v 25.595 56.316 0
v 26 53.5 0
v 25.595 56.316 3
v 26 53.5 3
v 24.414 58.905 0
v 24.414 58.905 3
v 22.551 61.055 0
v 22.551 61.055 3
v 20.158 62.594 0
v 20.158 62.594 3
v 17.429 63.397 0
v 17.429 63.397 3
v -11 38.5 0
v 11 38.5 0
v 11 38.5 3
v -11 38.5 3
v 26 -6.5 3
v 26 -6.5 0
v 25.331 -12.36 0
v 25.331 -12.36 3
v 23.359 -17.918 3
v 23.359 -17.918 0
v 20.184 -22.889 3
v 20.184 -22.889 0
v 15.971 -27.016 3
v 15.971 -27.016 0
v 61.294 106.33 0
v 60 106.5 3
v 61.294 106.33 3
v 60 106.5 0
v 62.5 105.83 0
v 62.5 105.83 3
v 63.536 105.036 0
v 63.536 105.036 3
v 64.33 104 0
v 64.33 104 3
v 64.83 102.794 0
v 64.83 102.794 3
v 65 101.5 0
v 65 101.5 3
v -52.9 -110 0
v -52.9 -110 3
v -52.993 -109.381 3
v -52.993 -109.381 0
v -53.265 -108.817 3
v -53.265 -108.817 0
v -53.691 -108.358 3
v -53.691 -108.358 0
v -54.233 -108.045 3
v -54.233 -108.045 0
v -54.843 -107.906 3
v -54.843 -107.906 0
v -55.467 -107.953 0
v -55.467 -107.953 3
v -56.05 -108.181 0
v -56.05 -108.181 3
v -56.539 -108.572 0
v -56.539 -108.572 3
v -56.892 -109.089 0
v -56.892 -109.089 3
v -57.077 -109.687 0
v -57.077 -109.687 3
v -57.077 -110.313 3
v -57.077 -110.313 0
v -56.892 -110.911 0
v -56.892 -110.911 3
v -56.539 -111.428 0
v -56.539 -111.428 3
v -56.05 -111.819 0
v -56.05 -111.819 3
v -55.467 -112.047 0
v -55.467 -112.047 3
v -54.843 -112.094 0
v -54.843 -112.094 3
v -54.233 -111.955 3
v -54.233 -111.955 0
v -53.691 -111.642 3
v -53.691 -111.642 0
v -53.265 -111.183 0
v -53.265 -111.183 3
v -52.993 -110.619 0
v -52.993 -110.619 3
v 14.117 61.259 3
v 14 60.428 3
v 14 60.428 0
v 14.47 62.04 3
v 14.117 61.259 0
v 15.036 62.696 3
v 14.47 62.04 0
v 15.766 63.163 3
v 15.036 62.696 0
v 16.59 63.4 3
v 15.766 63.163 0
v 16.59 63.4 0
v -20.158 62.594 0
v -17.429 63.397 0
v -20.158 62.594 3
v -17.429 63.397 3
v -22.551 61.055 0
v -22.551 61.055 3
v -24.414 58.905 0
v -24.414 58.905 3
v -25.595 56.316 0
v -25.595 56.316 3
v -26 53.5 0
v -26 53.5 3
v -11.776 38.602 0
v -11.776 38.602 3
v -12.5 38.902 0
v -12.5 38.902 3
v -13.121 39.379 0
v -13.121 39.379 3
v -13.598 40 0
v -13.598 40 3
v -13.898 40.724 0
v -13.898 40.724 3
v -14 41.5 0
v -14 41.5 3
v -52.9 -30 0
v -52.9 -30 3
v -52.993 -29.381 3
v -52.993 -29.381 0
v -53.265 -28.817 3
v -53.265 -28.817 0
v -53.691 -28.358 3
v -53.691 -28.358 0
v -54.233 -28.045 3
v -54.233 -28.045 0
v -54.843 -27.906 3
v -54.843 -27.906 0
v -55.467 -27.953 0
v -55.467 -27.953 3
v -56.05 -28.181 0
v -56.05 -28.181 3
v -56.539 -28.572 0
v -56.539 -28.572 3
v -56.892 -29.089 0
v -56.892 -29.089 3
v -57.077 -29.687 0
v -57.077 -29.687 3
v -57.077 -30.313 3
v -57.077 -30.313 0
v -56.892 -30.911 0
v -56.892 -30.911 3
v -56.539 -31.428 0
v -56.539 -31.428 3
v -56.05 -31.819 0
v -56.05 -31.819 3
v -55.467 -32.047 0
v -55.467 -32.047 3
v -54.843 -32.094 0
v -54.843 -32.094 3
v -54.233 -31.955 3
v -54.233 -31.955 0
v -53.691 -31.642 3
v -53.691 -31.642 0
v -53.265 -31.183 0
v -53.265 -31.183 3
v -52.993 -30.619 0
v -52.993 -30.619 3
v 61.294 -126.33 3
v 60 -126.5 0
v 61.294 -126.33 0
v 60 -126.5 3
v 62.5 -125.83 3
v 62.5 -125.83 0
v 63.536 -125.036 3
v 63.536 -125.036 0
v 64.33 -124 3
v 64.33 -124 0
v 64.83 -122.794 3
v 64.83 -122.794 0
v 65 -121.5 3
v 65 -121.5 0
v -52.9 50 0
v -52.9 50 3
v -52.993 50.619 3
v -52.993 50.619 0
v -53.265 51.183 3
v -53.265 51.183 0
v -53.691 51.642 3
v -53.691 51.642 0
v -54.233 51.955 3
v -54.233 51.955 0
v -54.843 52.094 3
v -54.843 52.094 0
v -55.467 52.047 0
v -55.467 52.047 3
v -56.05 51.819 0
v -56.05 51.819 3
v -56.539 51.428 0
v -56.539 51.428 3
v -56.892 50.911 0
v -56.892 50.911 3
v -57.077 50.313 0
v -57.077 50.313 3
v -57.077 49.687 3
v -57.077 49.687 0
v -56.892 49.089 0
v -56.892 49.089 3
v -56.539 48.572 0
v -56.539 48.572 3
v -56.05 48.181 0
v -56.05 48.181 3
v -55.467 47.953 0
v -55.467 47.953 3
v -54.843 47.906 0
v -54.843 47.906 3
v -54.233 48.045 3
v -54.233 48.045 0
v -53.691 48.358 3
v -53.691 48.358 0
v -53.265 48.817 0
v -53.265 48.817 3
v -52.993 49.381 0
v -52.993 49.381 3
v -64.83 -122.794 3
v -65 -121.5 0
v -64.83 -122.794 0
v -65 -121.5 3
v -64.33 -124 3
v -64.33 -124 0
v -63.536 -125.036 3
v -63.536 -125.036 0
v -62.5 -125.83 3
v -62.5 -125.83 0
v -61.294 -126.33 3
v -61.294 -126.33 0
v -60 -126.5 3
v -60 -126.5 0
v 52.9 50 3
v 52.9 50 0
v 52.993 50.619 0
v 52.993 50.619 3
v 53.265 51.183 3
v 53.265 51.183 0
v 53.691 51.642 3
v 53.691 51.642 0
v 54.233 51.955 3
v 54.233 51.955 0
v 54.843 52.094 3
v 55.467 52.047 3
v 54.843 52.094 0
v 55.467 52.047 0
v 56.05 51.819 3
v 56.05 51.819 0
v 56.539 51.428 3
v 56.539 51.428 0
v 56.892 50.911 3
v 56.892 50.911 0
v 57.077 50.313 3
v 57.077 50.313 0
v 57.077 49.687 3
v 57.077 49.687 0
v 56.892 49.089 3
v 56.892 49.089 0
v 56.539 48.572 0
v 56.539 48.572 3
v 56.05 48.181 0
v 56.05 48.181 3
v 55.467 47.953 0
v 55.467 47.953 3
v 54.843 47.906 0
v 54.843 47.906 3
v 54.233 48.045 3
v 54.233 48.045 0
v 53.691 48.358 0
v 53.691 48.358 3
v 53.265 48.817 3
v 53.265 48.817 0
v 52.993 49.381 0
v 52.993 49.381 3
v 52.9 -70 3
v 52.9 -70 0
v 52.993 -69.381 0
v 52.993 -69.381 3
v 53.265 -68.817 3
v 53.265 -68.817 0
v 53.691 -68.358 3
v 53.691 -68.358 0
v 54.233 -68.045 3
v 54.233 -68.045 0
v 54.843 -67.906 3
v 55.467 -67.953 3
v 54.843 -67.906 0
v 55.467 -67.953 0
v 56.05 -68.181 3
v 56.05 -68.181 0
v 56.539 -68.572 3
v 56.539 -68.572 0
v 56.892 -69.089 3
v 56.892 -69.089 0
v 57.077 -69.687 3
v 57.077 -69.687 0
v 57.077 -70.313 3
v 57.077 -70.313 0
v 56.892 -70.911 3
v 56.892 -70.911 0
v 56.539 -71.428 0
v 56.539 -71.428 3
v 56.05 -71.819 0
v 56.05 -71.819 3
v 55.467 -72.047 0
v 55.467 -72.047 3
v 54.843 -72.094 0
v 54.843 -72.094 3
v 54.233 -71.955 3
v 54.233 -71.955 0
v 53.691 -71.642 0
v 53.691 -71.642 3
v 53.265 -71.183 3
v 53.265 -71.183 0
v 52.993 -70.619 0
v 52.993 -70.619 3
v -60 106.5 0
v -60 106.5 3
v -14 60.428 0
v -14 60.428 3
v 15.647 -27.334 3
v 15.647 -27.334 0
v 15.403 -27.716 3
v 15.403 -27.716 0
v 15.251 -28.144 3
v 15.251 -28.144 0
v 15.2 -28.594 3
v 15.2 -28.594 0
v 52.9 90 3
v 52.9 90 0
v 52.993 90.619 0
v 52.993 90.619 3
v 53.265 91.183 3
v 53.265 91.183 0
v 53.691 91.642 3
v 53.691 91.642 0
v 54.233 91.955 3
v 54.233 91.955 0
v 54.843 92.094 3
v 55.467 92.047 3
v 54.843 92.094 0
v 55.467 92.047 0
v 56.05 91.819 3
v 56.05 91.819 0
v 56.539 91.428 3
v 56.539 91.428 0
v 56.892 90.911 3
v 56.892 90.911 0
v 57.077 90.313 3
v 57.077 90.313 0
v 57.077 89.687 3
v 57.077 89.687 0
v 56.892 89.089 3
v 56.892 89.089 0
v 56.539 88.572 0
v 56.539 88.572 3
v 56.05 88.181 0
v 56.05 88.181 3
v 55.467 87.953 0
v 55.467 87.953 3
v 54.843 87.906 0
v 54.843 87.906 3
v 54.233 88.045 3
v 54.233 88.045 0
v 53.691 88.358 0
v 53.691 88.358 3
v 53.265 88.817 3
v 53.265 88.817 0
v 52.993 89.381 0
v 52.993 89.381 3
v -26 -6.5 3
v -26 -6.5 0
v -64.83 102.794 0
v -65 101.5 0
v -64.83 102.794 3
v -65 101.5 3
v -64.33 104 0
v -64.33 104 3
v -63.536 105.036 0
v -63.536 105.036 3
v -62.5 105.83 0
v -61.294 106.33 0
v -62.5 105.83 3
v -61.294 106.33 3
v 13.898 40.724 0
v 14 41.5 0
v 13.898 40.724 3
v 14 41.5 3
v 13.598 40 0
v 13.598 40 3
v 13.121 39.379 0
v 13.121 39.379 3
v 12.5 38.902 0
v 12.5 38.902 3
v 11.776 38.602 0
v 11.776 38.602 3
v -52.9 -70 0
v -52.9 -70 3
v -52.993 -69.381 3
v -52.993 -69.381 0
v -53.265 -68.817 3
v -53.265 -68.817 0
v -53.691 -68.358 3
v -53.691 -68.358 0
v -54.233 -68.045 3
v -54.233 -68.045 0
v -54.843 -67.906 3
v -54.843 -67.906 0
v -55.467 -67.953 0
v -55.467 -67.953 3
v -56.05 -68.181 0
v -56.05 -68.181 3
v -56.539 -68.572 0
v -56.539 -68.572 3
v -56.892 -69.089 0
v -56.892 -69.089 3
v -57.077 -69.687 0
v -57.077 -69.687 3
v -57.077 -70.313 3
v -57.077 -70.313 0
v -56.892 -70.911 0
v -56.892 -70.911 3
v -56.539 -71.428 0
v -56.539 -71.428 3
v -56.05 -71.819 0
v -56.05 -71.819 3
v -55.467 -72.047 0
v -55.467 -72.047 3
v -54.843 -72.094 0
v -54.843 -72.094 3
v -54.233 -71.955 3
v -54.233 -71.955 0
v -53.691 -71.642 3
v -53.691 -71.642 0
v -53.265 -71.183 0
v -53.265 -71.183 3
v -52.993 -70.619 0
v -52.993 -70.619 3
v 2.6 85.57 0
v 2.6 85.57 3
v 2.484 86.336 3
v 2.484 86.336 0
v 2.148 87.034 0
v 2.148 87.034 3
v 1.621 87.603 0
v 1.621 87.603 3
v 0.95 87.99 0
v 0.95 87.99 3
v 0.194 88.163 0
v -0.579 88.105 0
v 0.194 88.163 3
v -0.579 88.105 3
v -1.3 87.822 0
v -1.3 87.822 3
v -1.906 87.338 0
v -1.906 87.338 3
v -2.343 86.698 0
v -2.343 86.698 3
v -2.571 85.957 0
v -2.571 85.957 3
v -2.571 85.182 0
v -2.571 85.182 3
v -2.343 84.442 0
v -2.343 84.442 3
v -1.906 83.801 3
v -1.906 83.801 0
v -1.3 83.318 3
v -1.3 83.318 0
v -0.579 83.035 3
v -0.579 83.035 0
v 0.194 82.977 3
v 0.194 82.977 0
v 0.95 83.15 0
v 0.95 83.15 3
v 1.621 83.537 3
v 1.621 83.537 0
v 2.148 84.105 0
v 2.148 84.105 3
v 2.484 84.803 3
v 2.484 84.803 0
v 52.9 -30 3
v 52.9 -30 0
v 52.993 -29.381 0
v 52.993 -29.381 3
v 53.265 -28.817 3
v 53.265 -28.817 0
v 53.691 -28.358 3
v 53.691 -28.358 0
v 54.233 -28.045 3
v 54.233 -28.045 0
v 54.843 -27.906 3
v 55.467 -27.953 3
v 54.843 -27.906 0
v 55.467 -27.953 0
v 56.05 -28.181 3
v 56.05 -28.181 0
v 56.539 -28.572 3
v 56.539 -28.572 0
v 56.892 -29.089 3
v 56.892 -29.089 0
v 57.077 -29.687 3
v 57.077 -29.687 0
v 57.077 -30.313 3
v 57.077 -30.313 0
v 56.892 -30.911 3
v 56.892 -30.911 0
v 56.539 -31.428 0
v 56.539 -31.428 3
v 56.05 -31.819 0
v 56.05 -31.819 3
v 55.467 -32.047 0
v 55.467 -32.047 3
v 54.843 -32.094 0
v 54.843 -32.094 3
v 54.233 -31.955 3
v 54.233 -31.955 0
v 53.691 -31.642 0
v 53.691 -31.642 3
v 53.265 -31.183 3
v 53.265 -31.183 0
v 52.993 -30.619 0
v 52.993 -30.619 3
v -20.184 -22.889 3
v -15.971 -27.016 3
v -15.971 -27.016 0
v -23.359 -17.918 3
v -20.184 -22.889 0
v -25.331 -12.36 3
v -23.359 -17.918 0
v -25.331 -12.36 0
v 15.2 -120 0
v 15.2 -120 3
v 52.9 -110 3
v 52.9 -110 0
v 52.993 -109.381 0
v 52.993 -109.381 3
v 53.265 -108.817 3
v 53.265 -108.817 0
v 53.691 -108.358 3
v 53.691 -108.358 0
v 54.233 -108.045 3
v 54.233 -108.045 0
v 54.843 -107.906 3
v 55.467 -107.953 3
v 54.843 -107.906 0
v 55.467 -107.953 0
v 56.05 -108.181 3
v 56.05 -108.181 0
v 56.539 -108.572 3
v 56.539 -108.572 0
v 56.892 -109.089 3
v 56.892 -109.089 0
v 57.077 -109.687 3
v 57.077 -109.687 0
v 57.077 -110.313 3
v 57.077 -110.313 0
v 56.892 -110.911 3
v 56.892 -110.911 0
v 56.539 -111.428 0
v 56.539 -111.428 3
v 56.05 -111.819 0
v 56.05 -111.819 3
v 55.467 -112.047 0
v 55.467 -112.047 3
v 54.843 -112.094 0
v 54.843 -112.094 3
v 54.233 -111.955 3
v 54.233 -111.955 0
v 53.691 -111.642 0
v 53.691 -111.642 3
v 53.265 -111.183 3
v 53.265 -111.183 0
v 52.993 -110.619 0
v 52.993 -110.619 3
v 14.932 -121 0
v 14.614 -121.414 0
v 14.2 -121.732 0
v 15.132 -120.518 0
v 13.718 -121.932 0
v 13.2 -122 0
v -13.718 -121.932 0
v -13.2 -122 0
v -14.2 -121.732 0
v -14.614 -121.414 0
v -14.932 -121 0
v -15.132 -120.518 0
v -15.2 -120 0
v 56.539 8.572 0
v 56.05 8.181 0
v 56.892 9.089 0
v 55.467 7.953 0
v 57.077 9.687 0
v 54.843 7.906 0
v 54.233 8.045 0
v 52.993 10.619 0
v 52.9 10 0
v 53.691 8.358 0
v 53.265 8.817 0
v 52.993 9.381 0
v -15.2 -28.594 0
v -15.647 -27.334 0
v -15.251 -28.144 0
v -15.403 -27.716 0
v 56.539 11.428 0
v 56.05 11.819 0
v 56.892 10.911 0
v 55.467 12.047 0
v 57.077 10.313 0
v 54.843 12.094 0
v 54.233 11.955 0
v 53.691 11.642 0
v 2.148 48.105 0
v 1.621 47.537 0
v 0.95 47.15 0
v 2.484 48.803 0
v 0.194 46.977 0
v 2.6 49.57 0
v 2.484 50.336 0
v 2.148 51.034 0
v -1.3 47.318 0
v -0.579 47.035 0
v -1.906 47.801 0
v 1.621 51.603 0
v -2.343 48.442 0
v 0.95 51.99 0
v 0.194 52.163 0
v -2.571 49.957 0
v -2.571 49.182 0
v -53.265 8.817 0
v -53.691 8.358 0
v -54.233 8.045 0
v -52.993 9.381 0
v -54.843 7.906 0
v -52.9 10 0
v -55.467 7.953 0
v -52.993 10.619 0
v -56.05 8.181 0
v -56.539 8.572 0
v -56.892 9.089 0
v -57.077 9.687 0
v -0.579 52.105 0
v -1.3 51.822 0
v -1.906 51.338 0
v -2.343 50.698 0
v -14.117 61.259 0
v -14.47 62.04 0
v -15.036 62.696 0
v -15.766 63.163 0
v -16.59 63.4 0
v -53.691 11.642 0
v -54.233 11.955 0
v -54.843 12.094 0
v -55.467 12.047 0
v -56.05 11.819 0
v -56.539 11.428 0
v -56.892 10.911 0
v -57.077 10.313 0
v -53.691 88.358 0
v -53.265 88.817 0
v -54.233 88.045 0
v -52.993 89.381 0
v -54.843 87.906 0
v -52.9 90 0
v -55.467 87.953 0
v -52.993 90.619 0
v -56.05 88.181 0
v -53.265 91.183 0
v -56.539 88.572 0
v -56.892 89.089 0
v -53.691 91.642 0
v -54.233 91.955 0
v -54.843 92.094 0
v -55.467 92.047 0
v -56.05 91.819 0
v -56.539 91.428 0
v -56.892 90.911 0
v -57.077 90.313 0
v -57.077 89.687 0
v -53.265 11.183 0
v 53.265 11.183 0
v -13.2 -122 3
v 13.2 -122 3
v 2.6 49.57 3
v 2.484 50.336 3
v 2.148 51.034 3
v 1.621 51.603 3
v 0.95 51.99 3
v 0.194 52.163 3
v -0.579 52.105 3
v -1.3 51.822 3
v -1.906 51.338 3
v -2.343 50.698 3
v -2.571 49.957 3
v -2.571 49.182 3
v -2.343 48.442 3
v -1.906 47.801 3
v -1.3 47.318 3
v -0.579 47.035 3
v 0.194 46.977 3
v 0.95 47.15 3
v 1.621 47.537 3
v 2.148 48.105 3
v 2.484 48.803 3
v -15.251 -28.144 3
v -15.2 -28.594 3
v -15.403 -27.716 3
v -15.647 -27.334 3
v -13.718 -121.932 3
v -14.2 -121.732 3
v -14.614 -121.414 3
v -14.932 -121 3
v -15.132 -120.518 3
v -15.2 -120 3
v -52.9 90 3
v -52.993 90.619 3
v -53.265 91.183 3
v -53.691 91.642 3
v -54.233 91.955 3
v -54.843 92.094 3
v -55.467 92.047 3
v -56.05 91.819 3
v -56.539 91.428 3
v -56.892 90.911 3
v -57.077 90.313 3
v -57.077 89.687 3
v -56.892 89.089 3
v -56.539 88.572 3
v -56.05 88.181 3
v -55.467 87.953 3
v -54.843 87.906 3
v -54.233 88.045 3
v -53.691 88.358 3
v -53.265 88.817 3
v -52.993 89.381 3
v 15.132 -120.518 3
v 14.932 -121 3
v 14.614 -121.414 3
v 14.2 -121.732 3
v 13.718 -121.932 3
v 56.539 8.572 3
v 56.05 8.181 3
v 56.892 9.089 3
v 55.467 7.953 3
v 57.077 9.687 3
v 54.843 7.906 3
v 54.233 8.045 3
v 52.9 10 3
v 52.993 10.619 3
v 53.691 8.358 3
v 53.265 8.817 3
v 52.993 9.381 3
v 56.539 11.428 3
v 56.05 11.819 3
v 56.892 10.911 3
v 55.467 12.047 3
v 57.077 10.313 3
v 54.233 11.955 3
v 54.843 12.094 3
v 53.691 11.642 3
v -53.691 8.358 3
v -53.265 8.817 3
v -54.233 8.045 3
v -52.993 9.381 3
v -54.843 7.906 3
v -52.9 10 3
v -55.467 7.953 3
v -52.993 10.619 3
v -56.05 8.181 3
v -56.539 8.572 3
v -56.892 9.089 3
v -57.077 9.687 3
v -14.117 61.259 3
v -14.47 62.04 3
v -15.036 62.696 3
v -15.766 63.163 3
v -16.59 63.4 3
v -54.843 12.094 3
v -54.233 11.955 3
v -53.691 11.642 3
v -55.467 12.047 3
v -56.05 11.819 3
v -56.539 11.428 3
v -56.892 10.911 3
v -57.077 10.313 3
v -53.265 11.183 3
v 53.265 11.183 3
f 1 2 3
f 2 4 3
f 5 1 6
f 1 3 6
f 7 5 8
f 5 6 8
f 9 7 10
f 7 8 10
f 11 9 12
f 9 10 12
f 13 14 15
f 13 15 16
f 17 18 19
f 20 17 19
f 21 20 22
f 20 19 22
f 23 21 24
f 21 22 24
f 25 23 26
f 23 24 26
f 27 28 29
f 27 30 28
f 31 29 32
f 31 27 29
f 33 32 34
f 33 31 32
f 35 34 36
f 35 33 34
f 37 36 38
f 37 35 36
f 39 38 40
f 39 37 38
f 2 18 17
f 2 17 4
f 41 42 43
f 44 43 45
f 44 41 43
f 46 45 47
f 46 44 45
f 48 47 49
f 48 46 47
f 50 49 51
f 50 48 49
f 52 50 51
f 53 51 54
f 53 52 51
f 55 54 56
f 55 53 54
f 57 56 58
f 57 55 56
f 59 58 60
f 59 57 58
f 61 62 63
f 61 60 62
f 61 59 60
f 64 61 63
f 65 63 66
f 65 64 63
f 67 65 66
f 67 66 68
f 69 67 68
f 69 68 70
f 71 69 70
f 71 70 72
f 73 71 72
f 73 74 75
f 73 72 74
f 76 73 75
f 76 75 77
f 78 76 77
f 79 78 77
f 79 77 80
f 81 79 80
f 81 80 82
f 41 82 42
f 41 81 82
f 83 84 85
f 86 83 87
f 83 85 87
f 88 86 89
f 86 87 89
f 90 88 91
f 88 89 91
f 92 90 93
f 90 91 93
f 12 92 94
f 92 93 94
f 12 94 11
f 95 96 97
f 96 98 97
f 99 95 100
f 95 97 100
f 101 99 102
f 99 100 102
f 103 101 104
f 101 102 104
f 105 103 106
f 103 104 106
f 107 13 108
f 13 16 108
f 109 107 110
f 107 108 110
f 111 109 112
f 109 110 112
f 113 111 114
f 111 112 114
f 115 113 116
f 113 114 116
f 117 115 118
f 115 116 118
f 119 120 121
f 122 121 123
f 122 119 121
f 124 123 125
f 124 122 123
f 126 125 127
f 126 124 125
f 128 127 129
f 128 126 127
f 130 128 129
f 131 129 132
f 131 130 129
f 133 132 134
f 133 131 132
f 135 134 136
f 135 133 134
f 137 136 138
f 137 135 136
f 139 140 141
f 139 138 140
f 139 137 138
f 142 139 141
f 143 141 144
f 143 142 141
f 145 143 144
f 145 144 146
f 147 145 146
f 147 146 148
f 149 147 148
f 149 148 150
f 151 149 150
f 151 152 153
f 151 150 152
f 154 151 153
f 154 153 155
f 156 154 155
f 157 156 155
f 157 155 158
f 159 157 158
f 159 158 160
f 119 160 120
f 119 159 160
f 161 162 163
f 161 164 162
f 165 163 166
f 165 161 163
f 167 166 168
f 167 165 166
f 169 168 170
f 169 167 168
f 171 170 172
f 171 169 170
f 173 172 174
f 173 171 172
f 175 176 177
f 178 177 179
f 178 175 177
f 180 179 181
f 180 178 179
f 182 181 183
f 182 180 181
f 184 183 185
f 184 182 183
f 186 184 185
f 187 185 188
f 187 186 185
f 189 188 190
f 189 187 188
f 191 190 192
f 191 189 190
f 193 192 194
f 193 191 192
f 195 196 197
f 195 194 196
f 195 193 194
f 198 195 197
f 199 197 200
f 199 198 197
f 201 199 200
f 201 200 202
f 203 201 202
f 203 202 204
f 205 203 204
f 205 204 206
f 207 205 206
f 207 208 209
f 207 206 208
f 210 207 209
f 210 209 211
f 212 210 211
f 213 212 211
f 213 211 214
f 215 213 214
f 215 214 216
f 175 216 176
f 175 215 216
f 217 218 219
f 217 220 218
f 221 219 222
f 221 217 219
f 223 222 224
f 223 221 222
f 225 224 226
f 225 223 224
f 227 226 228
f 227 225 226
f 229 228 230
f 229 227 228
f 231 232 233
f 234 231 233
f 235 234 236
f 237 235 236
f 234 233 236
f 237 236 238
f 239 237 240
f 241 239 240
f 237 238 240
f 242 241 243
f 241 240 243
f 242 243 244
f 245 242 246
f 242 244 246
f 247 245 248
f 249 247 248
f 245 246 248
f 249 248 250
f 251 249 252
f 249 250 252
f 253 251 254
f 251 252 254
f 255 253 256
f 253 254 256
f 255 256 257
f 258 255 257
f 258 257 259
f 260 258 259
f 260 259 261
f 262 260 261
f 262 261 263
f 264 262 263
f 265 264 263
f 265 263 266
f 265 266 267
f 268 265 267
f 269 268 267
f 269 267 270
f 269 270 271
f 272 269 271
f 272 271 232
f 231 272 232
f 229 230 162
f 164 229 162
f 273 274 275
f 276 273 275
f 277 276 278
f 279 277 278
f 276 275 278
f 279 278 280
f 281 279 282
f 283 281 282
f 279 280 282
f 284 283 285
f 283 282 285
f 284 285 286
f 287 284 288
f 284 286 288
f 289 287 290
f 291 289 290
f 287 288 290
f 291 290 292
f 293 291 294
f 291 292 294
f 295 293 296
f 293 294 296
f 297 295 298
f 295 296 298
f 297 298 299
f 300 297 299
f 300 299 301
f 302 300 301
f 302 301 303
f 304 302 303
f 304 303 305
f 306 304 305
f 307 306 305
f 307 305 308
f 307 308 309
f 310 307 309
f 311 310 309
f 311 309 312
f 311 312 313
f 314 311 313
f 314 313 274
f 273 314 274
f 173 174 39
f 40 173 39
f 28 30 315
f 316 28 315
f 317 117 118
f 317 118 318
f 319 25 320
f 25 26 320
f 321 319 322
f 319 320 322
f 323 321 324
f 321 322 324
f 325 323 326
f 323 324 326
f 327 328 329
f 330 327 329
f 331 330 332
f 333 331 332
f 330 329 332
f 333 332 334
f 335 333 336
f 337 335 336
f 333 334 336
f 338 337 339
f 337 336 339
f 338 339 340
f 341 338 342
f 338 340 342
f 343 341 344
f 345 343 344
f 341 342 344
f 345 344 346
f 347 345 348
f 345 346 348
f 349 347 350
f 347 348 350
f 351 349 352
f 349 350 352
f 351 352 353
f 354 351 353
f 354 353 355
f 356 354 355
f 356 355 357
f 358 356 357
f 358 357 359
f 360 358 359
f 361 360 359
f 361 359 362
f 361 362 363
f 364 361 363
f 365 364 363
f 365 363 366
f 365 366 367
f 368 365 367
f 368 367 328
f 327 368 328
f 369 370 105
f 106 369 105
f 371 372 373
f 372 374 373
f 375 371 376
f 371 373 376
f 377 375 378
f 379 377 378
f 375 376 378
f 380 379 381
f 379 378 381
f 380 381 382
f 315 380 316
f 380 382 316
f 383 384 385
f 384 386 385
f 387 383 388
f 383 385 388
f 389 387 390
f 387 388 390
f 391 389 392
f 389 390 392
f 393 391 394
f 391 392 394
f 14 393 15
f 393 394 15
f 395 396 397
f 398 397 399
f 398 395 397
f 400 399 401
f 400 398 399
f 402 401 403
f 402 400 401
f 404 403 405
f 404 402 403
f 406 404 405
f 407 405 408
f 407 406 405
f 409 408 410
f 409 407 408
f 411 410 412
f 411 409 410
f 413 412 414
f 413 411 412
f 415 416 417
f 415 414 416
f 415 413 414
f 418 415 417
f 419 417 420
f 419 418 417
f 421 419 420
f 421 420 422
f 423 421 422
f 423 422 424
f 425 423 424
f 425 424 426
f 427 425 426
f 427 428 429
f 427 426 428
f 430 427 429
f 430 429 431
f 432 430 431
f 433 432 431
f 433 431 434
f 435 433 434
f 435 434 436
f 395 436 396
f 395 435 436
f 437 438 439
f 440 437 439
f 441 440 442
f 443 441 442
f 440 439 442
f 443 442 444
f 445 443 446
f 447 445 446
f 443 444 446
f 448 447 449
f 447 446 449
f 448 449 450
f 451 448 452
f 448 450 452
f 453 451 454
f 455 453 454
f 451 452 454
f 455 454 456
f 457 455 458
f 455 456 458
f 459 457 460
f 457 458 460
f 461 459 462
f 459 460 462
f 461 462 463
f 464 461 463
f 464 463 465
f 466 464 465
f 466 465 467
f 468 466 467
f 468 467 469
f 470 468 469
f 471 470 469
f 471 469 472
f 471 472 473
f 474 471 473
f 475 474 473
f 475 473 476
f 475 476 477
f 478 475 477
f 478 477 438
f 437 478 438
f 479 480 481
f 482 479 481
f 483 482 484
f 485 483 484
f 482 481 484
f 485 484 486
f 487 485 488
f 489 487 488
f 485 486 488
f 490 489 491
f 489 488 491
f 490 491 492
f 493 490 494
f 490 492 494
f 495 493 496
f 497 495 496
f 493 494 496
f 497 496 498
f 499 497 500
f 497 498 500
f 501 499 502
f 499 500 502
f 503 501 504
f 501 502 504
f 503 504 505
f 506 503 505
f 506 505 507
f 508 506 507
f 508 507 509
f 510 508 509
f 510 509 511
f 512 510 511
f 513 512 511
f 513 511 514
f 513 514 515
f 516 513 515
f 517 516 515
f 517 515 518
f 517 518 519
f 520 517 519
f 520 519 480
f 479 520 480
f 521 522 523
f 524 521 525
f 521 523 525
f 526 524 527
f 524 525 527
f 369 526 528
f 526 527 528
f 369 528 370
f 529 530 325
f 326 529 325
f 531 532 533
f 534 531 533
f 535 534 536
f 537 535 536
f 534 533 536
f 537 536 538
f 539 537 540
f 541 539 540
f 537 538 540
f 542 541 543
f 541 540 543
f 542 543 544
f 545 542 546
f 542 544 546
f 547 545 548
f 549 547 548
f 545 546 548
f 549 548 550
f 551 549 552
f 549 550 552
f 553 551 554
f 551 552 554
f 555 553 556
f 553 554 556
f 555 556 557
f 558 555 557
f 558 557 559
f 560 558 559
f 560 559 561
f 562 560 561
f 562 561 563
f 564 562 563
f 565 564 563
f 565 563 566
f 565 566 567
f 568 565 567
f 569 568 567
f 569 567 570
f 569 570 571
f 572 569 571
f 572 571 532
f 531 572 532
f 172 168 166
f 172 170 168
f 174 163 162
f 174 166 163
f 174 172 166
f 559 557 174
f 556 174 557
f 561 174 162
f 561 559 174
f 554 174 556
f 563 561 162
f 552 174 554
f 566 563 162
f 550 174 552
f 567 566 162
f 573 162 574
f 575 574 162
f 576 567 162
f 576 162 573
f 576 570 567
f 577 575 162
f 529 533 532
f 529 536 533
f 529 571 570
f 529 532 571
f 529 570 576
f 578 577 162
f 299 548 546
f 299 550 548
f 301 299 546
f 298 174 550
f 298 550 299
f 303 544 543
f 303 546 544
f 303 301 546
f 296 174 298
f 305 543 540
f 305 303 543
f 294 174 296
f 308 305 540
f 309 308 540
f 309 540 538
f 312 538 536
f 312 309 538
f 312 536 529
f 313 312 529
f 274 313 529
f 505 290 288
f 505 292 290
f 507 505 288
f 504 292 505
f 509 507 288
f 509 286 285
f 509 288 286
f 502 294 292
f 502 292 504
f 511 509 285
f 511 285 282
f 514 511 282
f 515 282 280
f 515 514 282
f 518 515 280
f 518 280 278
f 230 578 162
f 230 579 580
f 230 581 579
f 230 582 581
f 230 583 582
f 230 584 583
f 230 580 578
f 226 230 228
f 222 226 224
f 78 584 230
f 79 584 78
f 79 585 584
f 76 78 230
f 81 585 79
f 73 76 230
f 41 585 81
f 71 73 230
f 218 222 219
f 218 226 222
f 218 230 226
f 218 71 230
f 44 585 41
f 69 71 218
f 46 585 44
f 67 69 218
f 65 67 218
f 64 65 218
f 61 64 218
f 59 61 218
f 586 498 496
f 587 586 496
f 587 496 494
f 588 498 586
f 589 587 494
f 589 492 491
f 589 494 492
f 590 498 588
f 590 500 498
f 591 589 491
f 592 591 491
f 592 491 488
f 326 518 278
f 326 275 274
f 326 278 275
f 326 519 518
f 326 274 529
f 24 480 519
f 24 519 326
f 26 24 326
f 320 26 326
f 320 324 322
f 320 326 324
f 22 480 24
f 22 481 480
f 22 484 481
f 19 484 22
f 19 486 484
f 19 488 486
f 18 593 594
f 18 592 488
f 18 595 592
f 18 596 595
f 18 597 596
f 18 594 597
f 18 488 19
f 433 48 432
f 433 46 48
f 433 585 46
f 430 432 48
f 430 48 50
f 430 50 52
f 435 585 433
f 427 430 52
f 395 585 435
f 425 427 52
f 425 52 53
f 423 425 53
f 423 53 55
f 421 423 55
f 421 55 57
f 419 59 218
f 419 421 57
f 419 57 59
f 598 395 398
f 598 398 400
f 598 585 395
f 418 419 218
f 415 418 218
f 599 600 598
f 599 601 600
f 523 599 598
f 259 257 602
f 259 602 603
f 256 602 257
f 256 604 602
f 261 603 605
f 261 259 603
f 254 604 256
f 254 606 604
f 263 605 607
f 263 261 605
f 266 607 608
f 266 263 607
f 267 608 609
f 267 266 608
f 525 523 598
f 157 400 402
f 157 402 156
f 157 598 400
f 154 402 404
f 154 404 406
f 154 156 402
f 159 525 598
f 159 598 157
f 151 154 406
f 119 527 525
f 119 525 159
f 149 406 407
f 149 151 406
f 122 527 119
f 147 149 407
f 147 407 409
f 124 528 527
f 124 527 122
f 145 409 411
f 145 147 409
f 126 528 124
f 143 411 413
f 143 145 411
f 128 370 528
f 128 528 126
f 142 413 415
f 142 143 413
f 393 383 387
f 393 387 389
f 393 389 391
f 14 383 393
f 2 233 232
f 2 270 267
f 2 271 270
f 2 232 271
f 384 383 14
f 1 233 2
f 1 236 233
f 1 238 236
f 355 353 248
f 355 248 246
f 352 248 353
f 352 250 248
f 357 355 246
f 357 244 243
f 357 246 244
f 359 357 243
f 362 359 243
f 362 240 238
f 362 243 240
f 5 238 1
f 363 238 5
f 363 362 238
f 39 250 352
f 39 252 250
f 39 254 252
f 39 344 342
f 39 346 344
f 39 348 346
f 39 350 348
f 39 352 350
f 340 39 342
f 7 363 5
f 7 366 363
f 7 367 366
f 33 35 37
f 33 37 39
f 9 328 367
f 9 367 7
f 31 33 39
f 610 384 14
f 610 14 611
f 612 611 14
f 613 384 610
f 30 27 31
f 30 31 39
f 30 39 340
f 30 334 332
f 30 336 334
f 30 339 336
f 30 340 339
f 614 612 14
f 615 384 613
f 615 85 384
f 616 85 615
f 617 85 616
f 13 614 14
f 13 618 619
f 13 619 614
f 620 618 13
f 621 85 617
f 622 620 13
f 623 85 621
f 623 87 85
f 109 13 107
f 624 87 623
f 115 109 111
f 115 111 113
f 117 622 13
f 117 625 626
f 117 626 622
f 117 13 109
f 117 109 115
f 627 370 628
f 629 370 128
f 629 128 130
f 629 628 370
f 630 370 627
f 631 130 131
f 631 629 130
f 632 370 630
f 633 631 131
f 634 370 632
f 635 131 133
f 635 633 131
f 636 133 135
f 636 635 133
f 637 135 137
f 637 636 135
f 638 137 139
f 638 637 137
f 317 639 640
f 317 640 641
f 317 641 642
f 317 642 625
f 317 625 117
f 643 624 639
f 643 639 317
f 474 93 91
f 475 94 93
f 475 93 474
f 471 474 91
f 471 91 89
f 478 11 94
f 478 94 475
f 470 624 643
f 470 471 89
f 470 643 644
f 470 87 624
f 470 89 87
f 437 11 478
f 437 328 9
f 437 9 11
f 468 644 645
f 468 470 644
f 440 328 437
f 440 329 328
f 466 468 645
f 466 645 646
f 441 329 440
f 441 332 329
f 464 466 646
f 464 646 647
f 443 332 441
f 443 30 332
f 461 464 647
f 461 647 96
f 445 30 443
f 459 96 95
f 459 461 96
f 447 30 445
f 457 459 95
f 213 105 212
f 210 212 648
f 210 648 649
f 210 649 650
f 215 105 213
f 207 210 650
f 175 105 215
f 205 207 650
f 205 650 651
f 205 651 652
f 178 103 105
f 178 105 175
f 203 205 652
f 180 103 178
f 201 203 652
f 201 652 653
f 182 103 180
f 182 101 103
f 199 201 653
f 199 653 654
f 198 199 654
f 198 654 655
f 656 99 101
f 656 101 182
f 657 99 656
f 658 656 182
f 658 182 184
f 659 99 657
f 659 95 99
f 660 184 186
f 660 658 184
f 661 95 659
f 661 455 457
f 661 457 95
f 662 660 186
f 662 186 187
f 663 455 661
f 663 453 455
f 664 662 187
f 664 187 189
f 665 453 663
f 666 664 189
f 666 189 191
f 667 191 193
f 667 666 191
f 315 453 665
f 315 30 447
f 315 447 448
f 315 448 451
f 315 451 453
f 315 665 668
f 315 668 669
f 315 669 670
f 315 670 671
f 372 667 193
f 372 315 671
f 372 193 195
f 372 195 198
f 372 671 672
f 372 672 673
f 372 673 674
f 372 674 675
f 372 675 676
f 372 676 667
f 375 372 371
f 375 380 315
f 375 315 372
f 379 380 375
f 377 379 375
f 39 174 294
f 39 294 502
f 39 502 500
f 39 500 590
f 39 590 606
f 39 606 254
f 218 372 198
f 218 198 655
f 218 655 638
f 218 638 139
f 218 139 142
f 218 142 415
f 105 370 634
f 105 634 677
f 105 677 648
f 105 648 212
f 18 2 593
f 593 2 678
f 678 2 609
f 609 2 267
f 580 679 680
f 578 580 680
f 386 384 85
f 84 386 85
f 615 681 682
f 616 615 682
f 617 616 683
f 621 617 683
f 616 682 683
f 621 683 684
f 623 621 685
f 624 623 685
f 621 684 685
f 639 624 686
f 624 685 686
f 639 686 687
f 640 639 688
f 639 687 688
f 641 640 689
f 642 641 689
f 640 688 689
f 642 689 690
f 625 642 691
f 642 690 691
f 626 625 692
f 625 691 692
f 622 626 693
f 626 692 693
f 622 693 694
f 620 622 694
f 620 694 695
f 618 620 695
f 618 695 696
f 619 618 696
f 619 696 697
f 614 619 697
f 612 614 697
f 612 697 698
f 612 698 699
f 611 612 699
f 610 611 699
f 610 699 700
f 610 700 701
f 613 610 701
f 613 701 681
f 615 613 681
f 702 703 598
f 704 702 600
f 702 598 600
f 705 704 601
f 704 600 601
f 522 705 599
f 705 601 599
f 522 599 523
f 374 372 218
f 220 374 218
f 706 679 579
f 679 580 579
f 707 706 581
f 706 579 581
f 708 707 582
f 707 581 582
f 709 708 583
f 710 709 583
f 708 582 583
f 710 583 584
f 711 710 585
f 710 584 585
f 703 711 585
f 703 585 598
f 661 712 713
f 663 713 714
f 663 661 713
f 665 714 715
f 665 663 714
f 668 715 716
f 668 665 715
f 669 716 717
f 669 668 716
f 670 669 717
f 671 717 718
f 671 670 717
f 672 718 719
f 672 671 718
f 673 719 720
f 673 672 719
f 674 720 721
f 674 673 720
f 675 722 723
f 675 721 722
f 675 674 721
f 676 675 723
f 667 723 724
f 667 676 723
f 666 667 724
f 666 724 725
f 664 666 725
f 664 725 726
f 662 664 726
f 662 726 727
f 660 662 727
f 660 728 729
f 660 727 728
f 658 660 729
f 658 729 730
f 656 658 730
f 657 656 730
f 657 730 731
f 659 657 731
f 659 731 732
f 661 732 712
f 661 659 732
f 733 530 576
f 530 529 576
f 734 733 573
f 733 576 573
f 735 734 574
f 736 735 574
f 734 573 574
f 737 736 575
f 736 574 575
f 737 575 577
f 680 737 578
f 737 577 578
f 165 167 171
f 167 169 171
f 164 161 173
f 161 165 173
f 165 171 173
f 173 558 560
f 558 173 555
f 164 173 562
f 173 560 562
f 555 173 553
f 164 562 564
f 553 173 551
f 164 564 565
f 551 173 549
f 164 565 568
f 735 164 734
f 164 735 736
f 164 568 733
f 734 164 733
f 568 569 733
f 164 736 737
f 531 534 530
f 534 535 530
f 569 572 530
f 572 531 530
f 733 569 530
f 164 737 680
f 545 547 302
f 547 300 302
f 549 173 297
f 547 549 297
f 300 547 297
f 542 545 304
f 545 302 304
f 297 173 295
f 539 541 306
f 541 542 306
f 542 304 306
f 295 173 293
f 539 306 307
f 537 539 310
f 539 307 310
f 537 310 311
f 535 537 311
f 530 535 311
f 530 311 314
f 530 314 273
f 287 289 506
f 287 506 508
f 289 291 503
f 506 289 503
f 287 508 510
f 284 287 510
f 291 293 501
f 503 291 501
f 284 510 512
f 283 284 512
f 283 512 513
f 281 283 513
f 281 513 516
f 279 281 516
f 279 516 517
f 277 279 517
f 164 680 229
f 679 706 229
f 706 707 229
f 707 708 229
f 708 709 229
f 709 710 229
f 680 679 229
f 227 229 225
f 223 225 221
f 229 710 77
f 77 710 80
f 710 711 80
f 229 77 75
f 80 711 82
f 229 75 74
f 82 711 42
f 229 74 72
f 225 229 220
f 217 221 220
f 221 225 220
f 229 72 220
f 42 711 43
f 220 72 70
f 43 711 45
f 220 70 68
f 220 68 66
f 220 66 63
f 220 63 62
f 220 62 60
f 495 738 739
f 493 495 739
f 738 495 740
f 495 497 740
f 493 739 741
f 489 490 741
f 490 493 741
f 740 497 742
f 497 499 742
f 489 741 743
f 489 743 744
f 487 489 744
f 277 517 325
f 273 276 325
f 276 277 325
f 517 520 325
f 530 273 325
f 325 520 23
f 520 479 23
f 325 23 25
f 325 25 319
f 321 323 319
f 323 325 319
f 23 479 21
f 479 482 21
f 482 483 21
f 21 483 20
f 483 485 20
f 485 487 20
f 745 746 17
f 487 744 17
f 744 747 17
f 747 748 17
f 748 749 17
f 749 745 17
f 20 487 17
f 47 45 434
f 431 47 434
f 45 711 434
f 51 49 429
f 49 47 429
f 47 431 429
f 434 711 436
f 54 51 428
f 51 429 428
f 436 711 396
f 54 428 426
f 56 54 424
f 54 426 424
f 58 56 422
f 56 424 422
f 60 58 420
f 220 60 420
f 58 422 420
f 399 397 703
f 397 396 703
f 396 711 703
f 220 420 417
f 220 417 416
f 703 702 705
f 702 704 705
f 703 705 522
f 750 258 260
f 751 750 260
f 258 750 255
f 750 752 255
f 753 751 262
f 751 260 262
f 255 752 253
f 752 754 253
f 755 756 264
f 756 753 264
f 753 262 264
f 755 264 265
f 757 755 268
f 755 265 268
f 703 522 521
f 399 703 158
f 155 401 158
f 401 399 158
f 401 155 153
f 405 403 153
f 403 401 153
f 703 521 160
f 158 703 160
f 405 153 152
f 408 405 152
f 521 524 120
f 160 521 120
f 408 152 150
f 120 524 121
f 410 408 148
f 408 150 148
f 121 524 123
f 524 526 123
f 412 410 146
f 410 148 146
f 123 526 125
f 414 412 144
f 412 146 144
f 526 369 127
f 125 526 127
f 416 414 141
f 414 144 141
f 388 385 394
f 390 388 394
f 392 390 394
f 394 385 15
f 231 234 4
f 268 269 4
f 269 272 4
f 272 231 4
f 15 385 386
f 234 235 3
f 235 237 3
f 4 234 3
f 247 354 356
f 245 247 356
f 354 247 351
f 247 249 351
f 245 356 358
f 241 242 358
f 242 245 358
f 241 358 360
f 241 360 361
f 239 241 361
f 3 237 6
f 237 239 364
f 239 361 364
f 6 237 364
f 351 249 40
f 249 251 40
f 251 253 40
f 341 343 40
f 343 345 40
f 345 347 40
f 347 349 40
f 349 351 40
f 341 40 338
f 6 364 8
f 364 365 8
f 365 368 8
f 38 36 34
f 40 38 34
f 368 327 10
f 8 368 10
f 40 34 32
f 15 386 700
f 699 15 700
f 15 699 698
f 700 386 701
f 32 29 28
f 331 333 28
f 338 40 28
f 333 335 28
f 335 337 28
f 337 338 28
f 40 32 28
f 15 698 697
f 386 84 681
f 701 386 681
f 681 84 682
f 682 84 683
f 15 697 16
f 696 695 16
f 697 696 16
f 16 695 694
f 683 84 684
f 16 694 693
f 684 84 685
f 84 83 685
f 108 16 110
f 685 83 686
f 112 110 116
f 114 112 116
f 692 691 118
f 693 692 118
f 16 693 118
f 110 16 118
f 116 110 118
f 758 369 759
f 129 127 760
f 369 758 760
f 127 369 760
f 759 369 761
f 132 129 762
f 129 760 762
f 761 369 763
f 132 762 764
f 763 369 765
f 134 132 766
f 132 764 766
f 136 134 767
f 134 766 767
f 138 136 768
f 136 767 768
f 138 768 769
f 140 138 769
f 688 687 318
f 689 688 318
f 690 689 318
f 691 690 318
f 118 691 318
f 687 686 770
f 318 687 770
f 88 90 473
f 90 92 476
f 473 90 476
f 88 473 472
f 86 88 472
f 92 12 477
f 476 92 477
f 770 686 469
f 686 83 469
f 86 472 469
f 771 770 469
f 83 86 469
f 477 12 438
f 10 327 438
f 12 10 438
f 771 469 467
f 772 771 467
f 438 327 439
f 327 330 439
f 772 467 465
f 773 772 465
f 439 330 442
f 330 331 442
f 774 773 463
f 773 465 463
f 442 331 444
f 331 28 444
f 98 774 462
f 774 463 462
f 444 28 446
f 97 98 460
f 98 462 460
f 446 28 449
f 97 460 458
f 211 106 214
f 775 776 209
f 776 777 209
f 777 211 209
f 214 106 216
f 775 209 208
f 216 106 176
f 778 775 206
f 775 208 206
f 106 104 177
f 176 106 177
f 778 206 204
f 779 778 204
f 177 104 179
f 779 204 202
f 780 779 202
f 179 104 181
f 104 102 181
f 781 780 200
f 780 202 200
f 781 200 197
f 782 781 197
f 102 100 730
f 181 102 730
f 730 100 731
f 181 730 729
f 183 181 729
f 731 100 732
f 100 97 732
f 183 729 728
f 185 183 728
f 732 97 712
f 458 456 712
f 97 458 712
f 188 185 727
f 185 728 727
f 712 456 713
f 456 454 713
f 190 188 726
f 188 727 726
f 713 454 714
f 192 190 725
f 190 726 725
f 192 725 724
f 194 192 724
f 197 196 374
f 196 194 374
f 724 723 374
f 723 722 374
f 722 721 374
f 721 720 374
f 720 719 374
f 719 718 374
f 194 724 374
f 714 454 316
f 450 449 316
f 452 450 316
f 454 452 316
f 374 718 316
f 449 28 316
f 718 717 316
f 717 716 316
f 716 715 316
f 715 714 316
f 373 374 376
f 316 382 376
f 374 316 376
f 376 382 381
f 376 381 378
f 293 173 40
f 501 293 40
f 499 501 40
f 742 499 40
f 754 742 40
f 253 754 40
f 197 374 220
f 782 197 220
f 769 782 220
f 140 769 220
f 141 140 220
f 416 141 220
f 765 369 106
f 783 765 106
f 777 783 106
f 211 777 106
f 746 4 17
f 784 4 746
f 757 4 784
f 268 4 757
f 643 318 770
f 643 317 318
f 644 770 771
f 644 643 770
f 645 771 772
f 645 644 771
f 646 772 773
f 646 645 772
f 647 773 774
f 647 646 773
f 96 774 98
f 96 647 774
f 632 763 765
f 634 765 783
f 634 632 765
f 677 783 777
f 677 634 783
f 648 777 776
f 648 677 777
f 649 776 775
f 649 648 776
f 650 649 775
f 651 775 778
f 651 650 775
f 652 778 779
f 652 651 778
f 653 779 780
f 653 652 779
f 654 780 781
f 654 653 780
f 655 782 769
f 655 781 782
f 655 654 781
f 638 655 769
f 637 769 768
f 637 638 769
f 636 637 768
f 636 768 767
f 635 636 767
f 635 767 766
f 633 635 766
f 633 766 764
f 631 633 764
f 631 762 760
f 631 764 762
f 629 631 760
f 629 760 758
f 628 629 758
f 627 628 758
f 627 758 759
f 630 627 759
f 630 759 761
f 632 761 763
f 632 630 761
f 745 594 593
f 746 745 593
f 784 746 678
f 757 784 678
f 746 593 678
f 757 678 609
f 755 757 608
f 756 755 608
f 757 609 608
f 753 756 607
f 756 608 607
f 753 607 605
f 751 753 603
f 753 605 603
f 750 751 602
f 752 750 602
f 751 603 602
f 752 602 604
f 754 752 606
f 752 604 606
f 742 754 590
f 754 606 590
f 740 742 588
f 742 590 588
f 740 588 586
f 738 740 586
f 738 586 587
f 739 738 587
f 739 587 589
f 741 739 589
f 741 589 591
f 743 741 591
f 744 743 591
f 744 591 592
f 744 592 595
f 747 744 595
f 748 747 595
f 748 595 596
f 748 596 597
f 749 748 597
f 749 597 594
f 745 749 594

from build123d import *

# Parameters (mm, degrees)
BOSS_EXTRUDE1_DEPTH = 3
SKETCH2_W           = 107
SKETCH2_H           = 20
CUT_EXTRUDE1_DEPTH  = 143.254173928
SKETCH3_R           = 26
CUT_EXTRUDE2_DEPTH  = 143.254173928
FILLET1_R           = 5
SKETCH4_W           = 30.4
SKETCH4_H           = 116.319851171
CUT_EXTRUDE3_DEPTH  = 143.254173928
SKETCH5_W           = 52
SKETCH5_H           = 70
CUT_EXTRUDE4_DEPTH  = 143.254173928
FILLET2_R           = 10
FILLET3_R           = 2
SKETCH6_W           = 28
SKETCH6_H           = 50
BOSS_EXTRUDE2_DEPTH = 3
FILLET4_R           = 3
SKETCH7_R           = 2.1
CUT_EXTRUDE5_DEPTH  = 143.254174065
SKETCH8_R           = 2.6
CUT_EXTRUDE6_DEPTH  = 143.254174065


with BuildPart() as part:
    # Sketch1 → Boss-Extrude1 (new body)
    with BuildSketch(Plane.XY):
        Polygon((-65, 106.5), (-65, -126.5), (65, -126.5), (65, 126.5), (-42, 126.5), (-42, 106.5), align=None)
    extrude(amount=BOSS_EXTRUDE1_DEPTH)

    # Sketch2 → Cut-Extrude1 (cut, through all)
    with BuildSketch(Plane.XY.offset(3)):
        with Locations((11.5, 116.5)):
            Rectangle(SKETCH2_W, SKETCH2_H)
    extrude(amount=-CUT_EXTRUDE1_DEPTH, mode=Mode.SUBTRACT)

    # Sketch3 → Cut-Extrude2 (cut, through all)
    with BuildSketch(Plane(origin=(0, 0, 0), x_dir=(-1, 0, 0), z_dir=(0, 0, -1))):
        with Locations((0, -6.5)):
            Circle(SKETCH3_R)
    extrude(amount=-CUT_EXTRUDE2_DEPTH, mode=Mode.SUBTRACT)

    # Fillet1
    fillet1_edges = [part.edges().sort_by_distance(p)[0] for p in [
        (65, -126.5, 1.5),
        (-65, -126.5, 1.5),
        (-65, 106.5, 1.5),
        (65, 106.5, 1.5),
    ]]
    fillet(fillet1_edges, radius=FILLET1_R)

    # Sketch4 → Cut-Extrude3 (cut, through all)
    with BuildSketch(Plane.XY.offset(3)):
        with Locations((0, -63.840074415)):
            Rectangle(SKETCH4_W, SKETCH4_H)
    extrude(amount=-CUT_EXTRUDE3_DEPTH, mode=Mode.SUBTRACT)

    # Sketch5 → Cut-Extrude4 (cut, through all)
    with BuildSketch(Plane(origin=(0, 0, 0), x_dir=(-1, 0, 0), z_dir=(0, 0, -1))):
        with Locations((0, 28.5)):
            Rectangle(SKETCH5_W, SKETCH5_H)
    extrude(amount=-CUT_EXTRUDE4_DEPTH, mode=Mode.SUBTRACT)

    # Fillet2
    fillet2_edges = [part.edges().sort_by_distance(p)[0] for p in [
        (26, 63.5, 1.5),
        (-26, 63.5, 1.5),
    ]]
    fillet(fillet2_edges, radius=FILLET2_R)

    # Fillet3
    fillet3_edges = [part.edges().sort_by_distance(p)[0] for p in [
        (-15.2, -27.594074997, 1.5),
        (15.2, -27.594074997, 1.5),
        (-15.2, -122, 1.5),
        (15.2, -122, 1.5),
    ]]
    fillet(fillet3_edges, radius=FILLET3_R)

    # Sketch6 → Boss-Extrude2 (add)
    with BuildSketch(Plane(origin=(0, 0, 0), x_dir=(-1, 0, 0), z_dir=(0, 0, -1))):
        with Locations((0, 63.5)):
            Rectangle(SKETCH6_W, SKETCH6_H)
    extrude(amount=-BOSS_EXTRUDE2_DEPTH)

    # Fillet4
    fillet4_edges = [part.edges().sort_by_distance(p)[0] for p in [
        (14, 38.5, 1.5),
        (-14, 38.5, 1.5),
        (-14, 63.5, 1.5),
        (14, 63.5, 1.5),
    ]]
    fillet(fillet4_edges, radius=FILLET4_R)

    # Sketch7 → Cut-Extrude5 (cut, through all)
    with BuildSketch(Plane(origin=(0, 0, 0), x_dir=(-1, 0, 0), z_dir=(0, 0, -1))):
        with Locations((-55, 90)):
            Circle(SKETCH7_R)
        with Locations((-55, 50)):
            Circle(SKETCH7_R)
        with Locations((-55, 10)):
            Circle(SKETCH7_R)
        with Locations((-55, -30)):
            Circle(SKETCH7_R)
        with Locations((-55, -70)):
            Circle(SKETCH7_R)
        with Locations((-55, -110)):
            Circle(SKETCH7_R)
    cut_extrude5 = extrude(amount=-CUT_EXTRUDE5_DEPTH, mode=Mode.SUBTRACT)

    # Mirror1: Cut-Extrude5 across plane
    add(cut_extrude5.mirror(Plane(origin=(0, 0, 0), x_dir=(0, 0, 1), z_dir=(1, 0, 0))), mode=Mode.SUBTRACT)

    # Sketch8 → Cut-Extrude6 (cut, through all)
    with BuildSketch(Plane.XY.offset(3)):
        with Locations((-1.1e-08, 49.569851171)):
            Circle(SKETCH8_R)
        with Locations((-1.1e-08, 85.569851171)):
            Circle(SKETCH8_R)
    extrude(amount=-CUT_EXTRUDE6_DEPTH, mode=Mode.SUBTRACT)


solid = part.part
